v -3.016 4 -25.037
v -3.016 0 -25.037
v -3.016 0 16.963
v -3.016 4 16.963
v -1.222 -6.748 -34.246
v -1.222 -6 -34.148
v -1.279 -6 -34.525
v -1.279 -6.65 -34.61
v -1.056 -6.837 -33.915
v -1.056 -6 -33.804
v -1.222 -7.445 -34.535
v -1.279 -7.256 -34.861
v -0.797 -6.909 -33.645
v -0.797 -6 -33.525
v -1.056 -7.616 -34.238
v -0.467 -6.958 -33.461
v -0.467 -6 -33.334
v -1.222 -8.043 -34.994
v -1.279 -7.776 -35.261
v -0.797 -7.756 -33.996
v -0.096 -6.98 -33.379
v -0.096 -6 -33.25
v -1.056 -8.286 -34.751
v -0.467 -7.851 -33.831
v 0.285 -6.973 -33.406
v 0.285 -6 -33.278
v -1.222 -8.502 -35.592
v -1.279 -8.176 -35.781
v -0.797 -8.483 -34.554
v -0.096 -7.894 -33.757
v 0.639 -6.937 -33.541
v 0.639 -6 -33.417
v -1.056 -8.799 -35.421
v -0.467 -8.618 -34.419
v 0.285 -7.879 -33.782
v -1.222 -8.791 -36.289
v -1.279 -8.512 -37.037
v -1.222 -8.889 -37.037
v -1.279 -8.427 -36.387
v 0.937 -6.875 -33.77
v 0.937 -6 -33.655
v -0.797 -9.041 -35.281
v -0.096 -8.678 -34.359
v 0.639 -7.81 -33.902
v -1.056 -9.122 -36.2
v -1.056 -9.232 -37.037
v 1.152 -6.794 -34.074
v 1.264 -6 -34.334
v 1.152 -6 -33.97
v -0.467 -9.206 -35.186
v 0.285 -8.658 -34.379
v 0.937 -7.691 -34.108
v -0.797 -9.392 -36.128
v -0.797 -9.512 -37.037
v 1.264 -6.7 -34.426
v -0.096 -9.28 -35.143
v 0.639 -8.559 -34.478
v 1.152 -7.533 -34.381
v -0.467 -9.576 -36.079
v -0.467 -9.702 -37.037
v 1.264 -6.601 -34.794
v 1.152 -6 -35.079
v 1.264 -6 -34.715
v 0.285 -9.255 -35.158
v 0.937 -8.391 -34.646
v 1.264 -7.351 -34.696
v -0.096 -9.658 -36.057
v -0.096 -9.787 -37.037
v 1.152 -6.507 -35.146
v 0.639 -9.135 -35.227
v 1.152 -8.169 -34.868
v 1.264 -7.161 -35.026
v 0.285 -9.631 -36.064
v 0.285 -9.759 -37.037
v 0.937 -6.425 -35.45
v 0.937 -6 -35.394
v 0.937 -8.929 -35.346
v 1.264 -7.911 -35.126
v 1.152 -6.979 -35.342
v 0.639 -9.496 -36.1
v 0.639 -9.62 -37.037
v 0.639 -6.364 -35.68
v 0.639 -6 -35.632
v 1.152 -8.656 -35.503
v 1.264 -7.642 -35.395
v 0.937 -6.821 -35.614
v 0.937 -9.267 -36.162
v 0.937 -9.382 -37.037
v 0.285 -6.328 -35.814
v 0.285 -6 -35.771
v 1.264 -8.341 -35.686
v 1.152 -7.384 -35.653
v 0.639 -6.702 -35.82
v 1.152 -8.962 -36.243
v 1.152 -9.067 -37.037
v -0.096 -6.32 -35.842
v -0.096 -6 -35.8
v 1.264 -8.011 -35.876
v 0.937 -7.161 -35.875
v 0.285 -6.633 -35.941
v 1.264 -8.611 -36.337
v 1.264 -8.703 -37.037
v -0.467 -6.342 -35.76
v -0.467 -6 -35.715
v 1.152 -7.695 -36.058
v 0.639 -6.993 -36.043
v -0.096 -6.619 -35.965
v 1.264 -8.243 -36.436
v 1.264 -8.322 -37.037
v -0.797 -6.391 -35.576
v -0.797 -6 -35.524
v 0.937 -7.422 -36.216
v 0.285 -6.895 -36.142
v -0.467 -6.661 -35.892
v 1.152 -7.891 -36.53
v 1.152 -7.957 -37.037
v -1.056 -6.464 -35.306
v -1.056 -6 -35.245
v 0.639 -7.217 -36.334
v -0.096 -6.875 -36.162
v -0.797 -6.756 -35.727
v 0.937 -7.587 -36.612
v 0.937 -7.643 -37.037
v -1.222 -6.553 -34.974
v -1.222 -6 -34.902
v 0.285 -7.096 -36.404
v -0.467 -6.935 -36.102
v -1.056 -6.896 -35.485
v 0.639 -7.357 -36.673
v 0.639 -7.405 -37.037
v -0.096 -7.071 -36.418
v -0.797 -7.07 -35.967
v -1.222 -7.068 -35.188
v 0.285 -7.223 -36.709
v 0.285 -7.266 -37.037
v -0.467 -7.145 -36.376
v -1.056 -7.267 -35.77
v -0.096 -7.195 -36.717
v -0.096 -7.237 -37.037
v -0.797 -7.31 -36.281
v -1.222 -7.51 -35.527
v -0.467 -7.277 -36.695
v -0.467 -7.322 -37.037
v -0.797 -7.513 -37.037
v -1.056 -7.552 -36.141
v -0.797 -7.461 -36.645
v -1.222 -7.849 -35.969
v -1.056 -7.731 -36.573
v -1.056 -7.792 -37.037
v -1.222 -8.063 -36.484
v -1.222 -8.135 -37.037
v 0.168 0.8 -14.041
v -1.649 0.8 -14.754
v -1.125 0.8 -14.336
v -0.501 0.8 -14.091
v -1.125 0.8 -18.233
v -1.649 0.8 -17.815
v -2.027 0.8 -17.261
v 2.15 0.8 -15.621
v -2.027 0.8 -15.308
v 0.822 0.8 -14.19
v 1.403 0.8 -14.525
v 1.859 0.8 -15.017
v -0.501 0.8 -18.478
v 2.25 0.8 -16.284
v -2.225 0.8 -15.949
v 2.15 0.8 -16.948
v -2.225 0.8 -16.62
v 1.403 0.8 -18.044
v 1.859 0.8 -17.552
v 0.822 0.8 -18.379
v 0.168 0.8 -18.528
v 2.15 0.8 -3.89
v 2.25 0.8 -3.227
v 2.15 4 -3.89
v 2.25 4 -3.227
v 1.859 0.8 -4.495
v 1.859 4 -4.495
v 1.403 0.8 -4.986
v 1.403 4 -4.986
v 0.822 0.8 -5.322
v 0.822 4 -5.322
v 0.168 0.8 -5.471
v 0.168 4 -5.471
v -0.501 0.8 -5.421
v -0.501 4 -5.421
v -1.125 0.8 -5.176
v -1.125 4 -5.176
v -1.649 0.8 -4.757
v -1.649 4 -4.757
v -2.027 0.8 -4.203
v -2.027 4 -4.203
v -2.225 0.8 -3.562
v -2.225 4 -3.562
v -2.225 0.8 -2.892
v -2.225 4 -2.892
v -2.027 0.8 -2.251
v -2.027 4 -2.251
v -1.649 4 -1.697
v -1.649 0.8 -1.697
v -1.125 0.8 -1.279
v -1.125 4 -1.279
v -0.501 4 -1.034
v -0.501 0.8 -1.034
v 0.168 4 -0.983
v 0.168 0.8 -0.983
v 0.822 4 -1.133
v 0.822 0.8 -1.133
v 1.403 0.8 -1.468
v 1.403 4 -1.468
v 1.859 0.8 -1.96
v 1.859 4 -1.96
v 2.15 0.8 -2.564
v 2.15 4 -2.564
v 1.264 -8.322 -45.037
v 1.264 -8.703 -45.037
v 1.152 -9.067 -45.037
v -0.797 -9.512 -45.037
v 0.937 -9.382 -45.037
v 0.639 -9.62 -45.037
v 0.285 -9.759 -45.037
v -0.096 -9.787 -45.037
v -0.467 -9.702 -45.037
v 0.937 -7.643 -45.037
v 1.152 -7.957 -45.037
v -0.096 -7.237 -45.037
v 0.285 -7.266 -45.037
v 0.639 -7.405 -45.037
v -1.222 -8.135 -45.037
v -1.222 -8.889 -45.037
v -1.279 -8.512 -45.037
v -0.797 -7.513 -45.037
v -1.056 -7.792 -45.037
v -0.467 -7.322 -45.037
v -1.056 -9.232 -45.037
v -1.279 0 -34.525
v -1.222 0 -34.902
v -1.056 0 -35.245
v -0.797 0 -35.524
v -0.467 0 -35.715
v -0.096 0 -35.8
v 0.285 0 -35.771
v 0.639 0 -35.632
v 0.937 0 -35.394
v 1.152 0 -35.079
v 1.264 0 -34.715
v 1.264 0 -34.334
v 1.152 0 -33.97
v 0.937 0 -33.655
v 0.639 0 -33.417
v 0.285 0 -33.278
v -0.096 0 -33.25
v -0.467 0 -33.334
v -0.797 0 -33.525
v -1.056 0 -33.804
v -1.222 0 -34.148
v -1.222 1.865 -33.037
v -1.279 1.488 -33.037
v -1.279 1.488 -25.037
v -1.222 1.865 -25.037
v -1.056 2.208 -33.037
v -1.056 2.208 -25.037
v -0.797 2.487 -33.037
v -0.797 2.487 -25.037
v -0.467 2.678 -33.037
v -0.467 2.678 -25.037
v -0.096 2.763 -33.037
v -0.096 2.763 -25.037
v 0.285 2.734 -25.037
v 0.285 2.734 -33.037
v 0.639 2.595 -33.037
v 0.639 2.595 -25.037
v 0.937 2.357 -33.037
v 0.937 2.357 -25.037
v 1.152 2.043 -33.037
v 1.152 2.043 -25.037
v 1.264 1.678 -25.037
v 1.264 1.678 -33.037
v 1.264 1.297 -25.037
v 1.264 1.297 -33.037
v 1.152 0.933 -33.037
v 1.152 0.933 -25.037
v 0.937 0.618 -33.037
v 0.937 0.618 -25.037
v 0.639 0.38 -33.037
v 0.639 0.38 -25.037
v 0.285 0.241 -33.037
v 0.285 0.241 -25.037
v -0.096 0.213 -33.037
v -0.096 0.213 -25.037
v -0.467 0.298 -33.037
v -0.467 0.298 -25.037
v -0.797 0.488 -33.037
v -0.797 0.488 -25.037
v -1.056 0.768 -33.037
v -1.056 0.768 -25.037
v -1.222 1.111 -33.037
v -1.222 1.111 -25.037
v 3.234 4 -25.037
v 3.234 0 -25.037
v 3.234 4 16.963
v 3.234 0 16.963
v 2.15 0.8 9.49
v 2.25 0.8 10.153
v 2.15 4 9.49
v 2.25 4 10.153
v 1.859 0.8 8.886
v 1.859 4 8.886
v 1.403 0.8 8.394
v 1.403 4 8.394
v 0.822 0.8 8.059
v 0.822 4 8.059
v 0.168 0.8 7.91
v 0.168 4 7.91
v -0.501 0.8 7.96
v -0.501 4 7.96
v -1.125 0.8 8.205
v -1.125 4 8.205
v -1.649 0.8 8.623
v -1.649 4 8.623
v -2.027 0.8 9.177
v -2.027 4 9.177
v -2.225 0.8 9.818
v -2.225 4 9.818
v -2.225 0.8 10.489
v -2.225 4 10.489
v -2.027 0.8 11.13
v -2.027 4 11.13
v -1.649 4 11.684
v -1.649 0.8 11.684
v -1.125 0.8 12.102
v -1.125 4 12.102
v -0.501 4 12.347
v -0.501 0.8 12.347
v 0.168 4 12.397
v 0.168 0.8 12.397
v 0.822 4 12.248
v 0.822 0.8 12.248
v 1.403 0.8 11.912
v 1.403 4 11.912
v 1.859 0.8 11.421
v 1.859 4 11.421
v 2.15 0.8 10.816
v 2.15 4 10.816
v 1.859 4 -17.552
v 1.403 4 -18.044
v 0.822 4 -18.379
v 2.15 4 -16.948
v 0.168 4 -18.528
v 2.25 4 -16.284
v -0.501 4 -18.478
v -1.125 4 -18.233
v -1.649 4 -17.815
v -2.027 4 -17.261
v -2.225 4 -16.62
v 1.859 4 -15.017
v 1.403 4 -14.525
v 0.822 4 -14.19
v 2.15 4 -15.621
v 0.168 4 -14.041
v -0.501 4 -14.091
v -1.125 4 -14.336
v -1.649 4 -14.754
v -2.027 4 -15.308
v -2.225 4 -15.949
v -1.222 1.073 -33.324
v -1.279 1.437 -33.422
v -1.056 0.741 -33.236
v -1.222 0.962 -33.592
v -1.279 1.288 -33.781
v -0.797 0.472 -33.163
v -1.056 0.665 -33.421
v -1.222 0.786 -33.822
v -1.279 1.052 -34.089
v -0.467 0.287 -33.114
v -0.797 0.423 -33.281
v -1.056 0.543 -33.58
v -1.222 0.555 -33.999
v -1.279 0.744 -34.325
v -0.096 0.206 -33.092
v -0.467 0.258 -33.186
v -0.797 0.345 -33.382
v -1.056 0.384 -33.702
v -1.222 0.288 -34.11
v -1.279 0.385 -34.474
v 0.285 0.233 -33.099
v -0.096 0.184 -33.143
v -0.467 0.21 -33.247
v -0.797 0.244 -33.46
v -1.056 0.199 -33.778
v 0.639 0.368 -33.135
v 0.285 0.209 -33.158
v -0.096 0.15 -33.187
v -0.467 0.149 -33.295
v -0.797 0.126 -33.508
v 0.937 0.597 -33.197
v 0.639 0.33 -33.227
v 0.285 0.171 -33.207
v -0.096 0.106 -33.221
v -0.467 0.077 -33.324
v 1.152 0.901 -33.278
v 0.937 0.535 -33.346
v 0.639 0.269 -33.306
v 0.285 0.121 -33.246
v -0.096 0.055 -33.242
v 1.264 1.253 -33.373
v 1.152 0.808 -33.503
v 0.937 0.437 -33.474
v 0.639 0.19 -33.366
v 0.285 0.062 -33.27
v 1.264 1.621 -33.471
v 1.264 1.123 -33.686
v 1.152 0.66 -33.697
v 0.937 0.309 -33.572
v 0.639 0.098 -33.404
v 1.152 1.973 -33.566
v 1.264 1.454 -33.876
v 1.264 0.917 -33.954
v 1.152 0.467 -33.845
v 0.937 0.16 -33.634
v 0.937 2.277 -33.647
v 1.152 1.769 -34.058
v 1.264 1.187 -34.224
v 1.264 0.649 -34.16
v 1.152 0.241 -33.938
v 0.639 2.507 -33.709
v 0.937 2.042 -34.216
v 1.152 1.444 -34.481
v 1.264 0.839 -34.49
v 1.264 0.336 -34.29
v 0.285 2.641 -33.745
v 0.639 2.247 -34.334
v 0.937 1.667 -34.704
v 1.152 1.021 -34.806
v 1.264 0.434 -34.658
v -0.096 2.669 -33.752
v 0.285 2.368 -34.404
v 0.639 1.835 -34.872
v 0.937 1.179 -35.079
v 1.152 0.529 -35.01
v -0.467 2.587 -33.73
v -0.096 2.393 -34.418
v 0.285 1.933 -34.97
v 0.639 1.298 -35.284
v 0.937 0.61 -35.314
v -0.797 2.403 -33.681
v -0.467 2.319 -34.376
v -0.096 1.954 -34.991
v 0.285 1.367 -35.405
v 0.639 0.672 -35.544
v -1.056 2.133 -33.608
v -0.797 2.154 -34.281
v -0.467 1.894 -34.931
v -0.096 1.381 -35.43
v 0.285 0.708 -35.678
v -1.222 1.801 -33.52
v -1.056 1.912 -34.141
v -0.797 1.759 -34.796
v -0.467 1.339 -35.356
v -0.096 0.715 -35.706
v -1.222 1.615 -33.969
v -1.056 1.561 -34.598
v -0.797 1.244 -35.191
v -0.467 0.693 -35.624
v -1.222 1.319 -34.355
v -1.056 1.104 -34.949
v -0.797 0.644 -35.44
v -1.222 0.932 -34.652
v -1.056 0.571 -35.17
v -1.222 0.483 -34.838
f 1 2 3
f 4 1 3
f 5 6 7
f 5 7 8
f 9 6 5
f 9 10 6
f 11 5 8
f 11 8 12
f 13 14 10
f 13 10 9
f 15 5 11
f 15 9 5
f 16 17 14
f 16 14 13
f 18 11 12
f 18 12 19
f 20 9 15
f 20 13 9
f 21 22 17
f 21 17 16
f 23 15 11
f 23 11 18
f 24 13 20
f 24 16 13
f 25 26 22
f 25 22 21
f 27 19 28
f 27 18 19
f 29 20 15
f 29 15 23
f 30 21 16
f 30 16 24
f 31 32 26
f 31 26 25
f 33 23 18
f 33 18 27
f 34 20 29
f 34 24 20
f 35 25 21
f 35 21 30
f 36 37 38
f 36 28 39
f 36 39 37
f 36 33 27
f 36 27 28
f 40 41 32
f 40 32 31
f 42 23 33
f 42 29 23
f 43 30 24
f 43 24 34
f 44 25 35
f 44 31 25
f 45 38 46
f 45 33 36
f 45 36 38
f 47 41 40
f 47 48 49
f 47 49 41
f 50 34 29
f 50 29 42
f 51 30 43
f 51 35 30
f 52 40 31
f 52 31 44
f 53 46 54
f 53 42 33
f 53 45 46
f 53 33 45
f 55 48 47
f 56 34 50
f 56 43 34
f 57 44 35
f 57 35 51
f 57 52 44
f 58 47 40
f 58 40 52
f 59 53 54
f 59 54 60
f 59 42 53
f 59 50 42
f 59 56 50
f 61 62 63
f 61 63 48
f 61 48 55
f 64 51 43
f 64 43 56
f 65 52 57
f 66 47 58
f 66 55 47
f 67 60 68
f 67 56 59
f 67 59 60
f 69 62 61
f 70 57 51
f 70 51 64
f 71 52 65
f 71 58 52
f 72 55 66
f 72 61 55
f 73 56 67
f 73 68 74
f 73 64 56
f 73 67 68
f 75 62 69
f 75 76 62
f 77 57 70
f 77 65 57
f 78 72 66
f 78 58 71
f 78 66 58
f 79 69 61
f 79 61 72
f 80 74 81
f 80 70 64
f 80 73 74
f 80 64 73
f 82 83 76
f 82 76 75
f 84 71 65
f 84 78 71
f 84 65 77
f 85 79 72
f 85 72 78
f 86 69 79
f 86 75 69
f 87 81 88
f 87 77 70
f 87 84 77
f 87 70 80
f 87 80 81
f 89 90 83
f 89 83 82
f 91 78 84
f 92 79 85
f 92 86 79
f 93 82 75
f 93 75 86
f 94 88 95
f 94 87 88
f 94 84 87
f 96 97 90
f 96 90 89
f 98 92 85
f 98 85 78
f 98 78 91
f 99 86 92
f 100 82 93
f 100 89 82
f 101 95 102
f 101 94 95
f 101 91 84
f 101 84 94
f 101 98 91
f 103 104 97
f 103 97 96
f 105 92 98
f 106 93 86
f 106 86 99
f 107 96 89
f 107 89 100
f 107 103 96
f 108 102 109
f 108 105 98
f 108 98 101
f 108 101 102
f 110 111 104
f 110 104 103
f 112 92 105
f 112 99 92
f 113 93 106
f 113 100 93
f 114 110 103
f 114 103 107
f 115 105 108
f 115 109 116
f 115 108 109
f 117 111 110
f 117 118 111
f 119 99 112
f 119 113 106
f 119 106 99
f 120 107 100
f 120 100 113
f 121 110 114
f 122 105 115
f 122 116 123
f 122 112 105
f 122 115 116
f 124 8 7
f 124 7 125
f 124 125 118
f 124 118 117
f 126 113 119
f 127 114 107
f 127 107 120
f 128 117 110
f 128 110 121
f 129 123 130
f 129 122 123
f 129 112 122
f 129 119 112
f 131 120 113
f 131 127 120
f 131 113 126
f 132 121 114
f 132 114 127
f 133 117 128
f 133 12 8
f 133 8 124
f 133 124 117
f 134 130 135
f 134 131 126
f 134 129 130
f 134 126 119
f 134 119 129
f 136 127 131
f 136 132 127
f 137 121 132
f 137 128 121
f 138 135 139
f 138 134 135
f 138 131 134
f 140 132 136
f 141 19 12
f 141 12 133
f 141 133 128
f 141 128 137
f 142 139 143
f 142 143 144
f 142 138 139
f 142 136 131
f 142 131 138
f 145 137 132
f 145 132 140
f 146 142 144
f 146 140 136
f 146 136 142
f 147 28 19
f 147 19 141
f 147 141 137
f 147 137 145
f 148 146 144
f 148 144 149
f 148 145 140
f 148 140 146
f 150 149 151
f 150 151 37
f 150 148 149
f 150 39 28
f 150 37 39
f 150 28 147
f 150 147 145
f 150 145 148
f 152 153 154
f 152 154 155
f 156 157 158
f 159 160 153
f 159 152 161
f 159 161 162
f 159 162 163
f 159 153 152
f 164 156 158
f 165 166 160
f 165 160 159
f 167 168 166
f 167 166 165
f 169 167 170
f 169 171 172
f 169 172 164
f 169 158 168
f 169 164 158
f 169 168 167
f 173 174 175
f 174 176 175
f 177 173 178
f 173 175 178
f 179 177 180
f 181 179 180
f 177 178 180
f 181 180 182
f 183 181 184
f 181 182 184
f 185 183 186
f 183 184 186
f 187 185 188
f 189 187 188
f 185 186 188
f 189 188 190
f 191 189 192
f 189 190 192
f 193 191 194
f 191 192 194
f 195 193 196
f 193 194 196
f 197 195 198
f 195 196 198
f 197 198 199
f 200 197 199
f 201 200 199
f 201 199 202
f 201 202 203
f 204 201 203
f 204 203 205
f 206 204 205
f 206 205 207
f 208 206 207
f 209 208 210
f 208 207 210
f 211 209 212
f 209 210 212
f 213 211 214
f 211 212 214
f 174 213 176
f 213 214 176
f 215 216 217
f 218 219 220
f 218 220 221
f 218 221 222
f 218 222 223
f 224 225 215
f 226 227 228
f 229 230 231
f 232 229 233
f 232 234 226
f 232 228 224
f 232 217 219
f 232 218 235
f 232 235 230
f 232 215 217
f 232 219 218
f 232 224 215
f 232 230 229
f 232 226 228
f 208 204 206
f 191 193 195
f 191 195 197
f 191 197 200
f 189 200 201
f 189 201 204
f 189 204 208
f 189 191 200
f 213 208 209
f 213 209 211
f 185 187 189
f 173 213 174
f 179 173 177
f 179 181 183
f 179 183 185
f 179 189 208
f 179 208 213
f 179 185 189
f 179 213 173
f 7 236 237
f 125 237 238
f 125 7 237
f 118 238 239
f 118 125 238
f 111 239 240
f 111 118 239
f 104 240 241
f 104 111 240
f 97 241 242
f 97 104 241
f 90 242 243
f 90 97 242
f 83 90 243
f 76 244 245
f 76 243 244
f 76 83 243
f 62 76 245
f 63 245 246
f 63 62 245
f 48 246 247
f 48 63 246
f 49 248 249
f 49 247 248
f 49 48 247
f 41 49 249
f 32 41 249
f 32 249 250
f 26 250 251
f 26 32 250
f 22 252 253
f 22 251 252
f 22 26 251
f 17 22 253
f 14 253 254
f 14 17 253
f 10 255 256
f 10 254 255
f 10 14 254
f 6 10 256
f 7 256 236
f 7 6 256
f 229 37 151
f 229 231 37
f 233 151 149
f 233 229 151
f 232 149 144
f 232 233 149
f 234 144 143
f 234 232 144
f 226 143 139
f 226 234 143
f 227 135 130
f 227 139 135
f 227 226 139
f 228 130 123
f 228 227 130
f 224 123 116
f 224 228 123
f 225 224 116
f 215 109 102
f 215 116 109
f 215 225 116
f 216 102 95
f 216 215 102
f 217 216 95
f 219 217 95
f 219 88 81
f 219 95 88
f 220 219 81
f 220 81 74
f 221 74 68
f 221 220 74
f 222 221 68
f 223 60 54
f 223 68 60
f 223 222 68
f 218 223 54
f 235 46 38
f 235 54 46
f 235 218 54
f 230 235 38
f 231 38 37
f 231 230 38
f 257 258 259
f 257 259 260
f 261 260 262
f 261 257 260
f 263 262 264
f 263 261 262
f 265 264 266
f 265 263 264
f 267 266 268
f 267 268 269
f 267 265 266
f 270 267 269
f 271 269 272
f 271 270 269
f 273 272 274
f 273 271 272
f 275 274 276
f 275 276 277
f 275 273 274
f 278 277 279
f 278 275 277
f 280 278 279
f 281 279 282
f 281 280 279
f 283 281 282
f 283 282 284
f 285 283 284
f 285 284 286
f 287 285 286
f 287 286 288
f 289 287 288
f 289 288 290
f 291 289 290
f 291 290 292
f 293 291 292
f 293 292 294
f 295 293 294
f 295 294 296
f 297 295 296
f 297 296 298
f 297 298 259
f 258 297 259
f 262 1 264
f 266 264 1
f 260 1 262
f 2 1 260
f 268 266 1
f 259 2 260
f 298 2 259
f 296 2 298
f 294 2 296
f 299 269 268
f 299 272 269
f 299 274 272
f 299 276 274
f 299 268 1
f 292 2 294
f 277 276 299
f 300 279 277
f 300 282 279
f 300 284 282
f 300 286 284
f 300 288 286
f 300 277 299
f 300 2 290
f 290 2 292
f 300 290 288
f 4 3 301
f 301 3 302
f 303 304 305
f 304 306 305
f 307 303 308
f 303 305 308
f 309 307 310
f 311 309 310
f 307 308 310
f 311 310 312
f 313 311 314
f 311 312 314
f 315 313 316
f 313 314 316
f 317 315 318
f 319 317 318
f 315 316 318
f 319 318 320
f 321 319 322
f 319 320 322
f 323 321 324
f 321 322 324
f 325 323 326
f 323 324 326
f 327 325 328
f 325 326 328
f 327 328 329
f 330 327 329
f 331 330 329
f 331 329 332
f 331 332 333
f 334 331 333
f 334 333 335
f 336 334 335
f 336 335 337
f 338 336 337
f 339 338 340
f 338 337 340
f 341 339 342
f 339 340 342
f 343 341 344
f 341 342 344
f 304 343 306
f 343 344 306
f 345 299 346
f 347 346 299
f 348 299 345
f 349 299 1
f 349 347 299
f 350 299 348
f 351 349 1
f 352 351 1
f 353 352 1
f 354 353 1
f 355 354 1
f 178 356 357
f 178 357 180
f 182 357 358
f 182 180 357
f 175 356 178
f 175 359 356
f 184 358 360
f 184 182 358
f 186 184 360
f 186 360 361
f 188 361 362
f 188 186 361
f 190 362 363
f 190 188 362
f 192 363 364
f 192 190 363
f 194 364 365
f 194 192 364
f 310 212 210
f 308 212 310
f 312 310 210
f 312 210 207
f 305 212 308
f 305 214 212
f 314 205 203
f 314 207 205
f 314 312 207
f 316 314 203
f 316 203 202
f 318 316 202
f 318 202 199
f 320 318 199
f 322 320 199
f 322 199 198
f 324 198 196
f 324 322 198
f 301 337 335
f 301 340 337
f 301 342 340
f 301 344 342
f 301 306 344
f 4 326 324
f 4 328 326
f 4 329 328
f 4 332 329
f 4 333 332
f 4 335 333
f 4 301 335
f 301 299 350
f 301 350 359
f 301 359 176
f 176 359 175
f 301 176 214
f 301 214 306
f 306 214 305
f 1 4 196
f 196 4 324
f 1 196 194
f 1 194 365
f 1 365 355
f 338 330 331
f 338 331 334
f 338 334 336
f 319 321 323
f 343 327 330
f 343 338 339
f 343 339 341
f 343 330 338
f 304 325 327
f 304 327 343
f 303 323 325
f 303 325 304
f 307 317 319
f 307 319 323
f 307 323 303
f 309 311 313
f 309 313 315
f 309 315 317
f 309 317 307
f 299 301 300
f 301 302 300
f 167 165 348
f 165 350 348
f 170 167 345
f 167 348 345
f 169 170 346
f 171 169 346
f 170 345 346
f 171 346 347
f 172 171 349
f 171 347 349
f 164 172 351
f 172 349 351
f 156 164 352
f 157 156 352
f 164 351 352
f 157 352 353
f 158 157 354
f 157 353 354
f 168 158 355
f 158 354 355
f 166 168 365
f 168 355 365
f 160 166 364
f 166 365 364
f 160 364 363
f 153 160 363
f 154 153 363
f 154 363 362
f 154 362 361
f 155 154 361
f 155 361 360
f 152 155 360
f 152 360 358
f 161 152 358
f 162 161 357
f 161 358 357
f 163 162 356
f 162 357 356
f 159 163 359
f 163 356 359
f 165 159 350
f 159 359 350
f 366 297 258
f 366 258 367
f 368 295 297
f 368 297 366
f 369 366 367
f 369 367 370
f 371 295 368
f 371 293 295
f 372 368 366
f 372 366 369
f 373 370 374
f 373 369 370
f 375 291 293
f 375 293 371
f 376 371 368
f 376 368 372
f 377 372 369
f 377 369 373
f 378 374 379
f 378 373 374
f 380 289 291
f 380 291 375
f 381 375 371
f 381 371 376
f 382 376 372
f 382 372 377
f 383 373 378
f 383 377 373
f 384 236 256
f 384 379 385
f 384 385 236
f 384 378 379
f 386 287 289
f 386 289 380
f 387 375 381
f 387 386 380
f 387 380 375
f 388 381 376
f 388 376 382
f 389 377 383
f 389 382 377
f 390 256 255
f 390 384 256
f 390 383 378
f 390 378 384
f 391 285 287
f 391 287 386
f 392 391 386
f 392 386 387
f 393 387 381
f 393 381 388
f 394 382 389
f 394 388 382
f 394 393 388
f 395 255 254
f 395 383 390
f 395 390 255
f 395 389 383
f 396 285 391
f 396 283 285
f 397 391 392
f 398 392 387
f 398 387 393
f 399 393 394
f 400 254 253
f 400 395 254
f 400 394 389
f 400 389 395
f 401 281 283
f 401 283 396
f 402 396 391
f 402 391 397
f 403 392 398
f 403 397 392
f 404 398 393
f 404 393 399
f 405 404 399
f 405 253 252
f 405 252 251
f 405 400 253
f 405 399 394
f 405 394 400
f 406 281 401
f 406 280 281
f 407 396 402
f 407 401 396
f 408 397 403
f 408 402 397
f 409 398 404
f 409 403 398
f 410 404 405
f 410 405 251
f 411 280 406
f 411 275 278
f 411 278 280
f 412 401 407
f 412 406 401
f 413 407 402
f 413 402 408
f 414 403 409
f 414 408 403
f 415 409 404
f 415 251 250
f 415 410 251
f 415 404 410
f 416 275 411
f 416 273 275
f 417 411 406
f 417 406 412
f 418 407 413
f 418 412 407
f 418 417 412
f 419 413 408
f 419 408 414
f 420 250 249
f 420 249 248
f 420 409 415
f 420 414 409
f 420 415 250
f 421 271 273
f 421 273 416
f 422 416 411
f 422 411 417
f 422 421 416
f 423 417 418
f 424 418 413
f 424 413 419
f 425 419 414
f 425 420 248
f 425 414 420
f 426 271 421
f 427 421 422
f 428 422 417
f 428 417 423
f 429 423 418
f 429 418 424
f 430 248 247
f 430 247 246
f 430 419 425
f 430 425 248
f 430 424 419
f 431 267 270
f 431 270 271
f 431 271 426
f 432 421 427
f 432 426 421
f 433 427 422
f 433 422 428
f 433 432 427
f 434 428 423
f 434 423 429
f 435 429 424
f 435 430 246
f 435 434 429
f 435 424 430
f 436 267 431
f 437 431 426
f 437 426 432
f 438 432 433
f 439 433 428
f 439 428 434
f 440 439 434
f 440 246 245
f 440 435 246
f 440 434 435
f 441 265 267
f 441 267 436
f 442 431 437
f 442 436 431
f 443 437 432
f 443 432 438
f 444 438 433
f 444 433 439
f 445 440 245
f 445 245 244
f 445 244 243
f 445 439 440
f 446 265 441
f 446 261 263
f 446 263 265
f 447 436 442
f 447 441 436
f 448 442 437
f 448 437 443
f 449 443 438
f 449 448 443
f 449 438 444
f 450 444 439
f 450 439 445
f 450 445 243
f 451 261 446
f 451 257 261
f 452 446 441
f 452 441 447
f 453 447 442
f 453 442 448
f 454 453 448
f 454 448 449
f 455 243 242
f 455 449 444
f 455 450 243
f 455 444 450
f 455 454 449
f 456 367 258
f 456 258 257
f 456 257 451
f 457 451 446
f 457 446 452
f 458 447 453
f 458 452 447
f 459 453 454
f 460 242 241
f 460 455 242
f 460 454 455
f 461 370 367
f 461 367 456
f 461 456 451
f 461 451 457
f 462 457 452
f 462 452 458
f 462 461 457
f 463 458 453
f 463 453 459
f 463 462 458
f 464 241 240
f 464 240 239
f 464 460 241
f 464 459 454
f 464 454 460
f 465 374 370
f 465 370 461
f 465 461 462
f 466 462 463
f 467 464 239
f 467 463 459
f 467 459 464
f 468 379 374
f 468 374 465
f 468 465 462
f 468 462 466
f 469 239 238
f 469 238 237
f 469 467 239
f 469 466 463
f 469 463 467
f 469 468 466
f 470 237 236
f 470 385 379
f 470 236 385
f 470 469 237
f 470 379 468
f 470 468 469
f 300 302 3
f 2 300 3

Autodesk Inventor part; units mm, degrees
ref_plane "YZ Plane" through (0, 0, 0) normal (1, 0, 0) x (0, 1, 0)
ref_plane "XZ Plane" through (0, 0, 0) normal (0, 1, 0) x (-1, 0, 0)
ref_plane "XY Plane" through (0, 0, 0) normal (0, 0, 1) x (1, 0, 0)
sketch "Sketch1" plane through (0, 0, 0) normal (0, 1, 0) x (-1, 0, 0)
  line L0 (3.0162, -25.0369) -> (-3.2338, -25.0369)
  line L1 (3.0162, -25.0369) -> (3.0162, 16.9631)
  line L2 (3.0162, 16.9631) -> (-3.2338, 16.9631)
  line L3 (-3.2338, 16.9631) -> (-3.2338, -25.0369)
  point P0 (0, 0)
  dimension "d1" = 6.25
  dimension "d3" = 42
extrude "Extrusion1" add sketch "Sketch1" along normal blind 4
sketch "Sketch10" plane through (3.2338, 0, -25.0369) normal (0, 0, -1) x (-1, 0, 0)
  circle A0 centre (3.2338, 1.4878) radius 1.2786
  point P0 (3.2338, 0)
sketch "Sketch12" plane through (0, 0, 0) normal (1, 0, 0) x (0, 1, 0)
  line L0 (0, -25.0369) -> (4, -25.0369) projected
  line L1 (2, -25.0369) -> (2, -33.0369)
  line L2 (0, -35.0369) -> (-6, -35.0369)
  line L3 (-8, -37.0369) -> (-8, -45.0369)
  arc A0 (0, -35.0369) -> (2, -33.0369) centre (0, -33.0369) ccw
  arc A1 (-6, -35.0369) -> (-8, -37.0369) centre (-6, -37.0369) ccw
  point P0 (0, 0)
  point P1 (2, -35.0369)
  point P2 (-8, -35.0369)
  dimension "d15" = 10
  dimension "d16" = 10
  dimension "d17" = 10
  dimension "d18" = 2
sweep "Sweep1" add profiles "Sketch10" path "Sketch12" path curves L1 A0 L2 A1 L3
sketch "Sketch14" plane through (0, 4, 0) normal (0, 1, 0) x (1, 0, 0)
  circle A0 centre (0, 3.2271) radius 2.25
  circle A1 centre (0, 16.2844) radius 2.25
  circle A2 centre (0, -10.1533) radius 2.25
  point P0 (0, 0)
  dimension "d29" = 4.5
  dimension "d30" = 4.5
  dimension "d31" = 4.5
extrude "Extrusion5" cut sketch "Sketch14" against normal blind 3.2
properties part number "Slits"
